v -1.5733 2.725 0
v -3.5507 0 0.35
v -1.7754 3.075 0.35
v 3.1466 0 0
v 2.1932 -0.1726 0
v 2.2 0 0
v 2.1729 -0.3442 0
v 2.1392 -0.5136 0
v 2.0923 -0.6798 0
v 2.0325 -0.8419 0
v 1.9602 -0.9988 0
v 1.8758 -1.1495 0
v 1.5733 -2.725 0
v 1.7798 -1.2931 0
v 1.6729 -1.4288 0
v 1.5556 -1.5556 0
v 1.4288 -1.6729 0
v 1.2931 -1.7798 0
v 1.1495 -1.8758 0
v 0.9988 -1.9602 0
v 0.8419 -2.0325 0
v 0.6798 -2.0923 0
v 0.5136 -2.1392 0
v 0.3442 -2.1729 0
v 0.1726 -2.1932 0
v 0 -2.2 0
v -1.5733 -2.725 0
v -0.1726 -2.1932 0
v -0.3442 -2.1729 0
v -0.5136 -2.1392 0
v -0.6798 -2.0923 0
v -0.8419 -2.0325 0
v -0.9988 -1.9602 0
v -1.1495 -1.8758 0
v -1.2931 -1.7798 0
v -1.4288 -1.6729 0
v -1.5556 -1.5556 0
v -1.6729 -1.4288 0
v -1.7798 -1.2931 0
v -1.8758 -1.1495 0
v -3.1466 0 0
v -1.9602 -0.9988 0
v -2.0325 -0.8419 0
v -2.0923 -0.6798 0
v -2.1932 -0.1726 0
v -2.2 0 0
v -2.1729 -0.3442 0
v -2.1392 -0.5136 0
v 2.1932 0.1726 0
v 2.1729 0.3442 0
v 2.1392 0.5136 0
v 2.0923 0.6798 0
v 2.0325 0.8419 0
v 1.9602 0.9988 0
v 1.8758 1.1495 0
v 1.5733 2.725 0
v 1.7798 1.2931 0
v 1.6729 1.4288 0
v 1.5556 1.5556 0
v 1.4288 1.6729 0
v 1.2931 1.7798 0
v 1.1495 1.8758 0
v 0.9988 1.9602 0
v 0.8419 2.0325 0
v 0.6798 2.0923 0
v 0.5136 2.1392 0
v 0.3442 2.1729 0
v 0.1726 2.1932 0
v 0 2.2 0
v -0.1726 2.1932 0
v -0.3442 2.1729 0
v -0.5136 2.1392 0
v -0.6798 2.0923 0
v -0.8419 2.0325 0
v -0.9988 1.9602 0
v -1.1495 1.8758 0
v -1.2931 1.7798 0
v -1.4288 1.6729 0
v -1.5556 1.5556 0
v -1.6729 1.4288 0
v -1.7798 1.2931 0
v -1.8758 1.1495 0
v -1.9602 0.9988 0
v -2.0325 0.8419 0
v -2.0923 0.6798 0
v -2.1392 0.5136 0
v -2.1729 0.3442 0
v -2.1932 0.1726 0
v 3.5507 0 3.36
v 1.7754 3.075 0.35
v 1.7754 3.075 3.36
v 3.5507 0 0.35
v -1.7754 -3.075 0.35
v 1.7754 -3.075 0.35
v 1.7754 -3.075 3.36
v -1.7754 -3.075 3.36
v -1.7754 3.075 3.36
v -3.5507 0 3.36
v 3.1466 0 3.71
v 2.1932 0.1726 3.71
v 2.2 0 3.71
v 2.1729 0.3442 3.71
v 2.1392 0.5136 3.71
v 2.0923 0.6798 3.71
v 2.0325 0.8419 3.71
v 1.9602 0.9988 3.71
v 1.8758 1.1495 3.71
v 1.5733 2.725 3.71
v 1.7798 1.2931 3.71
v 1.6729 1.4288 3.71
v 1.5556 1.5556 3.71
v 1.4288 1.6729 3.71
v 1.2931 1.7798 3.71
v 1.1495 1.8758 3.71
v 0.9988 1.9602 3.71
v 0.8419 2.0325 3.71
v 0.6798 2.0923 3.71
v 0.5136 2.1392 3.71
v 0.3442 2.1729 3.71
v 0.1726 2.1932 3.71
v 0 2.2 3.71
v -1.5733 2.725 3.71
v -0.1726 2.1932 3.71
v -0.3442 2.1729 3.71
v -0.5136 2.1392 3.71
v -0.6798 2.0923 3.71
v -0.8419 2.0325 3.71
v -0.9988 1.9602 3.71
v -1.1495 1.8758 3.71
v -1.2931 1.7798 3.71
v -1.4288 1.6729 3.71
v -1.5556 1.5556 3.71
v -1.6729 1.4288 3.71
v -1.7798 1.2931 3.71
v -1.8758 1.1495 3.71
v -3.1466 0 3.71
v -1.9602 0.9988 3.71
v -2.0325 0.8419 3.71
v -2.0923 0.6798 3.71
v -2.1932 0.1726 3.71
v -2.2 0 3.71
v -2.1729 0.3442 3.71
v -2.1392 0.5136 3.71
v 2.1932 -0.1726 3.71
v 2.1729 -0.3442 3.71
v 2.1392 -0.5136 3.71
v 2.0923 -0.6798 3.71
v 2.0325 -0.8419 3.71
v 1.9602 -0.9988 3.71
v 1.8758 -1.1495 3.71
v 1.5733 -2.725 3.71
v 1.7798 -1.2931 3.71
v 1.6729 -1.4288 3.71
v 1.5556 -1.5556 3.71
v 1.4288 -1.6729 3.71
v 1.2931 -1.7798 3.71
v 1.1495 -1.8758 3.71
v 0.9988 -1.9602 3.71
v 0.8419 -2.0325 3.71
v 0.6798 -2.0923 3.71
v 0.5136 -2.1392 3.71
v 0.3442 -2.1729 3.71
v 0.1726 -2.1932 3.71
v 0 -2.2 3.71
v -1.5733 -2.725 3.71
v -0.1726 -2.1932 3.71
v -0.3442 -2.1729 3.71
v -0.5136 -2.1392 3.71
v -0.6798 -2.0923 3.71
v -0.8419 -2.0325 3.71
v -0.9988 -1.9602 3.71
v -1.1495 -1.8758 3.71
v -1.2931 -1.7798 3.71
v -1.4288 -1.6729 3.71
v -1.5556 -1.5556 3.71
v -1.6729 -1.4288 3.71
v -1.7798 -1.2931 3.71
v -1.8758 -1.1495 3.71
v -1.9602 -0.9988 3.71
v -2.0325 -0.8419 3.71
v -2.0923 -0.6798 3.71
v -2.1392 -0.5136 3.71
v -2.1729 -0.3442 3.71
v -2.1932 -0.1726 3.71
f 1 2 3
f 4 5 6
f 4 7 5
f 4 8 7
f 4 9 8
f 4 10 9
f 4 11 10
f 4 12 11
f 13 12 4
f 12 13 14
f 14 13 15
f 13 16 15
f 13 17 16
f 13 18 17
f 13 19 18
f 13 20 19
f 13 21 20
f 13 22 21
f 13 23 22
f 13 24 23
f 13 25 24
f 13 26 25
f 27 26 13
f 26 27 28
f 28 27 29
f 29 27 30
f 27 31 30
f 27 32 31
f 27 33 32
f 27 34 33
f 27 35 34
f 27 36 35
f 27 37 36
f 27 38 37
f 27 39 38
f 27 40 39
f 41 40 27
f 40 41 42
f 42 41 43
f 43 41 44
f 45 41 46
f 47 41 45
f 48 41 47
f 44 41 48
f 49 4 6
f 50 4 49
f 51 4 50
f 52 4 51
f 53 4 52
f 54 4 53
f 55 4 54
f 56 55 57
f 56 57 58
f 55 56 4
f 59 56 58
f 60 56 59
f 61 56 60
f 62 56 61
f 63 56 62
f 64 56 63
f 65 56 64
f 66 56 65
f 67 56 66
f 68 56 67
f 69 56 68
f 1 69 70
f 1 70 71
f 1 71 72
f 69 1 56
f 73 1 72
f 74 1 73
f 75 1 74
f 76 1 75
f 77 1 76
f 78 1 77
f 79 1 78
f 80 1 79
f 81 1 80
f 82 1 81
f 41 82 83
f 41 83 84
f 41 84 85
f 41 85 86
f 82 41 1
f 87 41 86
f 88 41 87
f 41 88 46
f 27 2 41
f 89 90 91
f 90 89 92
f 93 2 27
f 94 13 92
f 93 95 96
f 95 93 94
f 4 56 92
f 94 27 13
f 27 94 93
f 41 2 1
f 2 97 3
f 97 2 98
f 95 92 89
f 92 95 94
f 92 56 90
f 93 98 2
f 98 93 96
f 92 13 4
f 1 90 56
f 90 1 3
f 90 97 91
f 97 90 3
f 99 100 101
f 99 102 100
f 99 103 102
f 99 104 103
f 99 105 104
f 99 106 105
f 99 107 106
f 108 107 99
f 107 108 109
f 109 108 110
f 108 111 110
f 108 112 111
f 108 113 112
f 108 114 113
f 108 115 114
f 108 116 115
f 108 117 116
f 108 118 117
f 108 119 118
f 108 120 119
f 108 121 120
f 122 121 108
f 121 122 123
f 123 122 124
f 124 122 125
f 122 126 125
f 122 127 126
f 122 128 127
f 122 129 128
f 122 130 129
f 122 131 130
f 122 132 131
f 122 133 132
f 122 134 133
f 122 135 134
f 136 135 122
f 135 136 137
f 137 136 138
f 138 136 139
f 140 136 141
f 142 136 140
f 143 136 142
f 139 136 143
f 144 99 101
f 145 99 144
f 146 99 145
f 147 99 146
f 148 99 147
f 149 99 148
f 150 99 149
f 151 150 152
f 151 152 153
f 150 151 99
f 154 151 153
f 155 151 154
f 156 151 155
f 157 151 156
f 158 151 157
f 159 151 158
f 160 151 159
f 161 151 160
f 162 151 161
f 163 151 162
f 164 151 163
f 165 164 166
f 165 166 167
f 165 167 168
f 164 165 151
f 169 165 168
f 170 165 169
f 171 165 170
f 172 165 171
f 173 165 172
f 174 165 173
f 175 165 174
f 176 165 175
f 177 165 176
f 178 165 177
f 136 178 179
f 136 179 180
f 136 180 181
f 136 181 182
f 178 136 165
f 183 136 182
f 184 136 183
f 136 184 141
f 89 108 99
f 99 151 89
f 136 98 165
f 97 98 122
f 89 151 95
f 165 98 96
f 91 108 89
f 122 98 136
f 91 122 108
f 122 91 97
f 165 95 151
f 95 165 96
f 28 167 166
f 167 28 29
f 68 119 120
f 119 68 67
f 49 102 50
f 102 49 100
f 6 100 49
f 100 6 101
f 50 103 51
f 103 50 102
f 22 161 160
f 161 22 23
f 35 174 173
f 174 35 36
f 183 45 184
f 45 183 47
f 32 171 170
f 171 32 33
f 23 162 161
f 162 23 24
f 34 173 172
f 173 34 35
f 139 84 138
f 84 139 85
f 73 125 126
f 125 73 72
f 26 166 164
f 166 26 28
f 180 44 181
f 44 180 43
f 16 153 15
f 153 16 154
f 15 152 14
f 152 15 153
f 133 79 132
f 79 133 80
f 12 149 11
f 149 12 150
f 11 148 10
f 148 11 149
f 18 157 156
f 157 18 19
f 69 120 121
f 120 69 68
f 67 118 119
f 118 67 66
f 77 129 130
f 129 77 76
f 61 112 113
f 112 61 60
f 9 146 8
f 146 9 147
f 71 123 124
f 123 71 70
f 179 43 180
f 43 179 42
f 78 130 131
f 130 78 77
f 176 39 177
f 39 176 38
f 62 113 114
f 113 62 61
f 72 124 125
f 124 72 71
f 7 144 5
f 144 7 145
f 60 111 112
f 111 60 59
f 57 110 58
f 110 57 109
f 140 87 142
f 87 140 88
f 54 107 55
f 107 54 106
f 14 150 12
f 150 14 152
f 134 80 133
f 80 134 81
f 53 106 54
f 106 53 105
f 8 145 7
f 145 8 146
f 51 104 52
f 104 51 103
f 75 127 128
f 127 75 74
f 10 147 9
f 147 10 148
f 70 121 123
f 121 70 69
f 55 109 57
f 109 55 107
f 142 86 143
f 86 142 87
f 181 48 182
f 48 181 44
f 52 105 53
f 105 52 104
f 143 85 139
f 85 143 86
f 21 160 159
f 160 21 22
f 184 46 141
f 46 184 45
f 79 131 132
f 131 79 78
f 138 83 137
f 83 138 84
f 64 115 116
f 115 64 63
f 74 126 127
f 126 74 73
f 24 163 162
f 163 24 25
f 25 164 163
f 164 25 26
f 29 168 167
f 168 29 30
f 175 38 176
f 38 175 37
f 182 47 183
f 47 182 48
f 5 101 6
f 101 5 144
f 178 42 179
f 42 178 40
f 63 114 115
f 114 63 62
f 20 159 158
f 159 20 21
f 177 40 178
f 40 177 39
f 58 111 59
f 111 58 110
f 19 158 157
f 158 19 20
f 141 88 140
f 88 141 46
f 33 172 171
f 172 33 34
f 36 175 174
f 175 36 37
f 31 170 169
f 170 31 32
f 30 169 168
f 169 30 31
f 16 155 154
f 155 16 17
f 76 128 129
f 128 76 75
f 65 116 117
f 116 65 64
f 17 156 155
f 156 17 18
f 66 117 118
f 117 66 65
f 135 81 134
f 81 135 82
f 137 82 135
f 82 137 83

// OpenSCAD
$fn = 80;

// T-slot nut parameters (mm)
screw_d = 4.0;          // screw size (clearance hole)
across_flats = 6.0;     // hex across flats
thickness = 3.7;        // nut thickness

// Practical clearances/tweaks
hole_clearance = 0.4;   // added to screw_d for clearance
hex_clearance  = 0.15;  // added to across_flats for print/fit
edge_chamfer   = 0.35;  // small chamfer on top/bottom edges

module hex_prism_af(af, h){
    // Regular hex with given across-flats:
    // circumradius R = af / sqrt(3)
    R = af / sqrt(3);
    cylinder(h=h, r=R, $fn=6);
}

module chamfered_hex_nut(af, h, chamfer){
    // Create a simple chamfer by hulling two slightly different hex prisms
    // near the ends.
    chamfer = min(chamfer, h/2 - 0.01);
    hull(){
        translate([0,0,0]) hex_prism_af(af - 2*chamfer, 0.01);
        translate([0,0,chamfer]) hex_prism_af(af, 0.01);
    }
    translate([0,0,chamfer])
        hex_prism_af(af, h - 2*chamfer);
    hull(){
        translate([0,0,h - chamfer]) hex_prism_af(af, 0.01);
        translate([0,0,h]) hex_prism_af(af - 2*chamfer, 0.01);
    }
}

difference(){
    chamfered_hex_nut(across_flats + hex_clearance, thickness, edge_chamfer);

    // Through hole for screw
    translate([0,0,-0.2])
        cylinder(h=thickness + 0.4, d=screw_d + hole_clearance, $fn=80);
}
